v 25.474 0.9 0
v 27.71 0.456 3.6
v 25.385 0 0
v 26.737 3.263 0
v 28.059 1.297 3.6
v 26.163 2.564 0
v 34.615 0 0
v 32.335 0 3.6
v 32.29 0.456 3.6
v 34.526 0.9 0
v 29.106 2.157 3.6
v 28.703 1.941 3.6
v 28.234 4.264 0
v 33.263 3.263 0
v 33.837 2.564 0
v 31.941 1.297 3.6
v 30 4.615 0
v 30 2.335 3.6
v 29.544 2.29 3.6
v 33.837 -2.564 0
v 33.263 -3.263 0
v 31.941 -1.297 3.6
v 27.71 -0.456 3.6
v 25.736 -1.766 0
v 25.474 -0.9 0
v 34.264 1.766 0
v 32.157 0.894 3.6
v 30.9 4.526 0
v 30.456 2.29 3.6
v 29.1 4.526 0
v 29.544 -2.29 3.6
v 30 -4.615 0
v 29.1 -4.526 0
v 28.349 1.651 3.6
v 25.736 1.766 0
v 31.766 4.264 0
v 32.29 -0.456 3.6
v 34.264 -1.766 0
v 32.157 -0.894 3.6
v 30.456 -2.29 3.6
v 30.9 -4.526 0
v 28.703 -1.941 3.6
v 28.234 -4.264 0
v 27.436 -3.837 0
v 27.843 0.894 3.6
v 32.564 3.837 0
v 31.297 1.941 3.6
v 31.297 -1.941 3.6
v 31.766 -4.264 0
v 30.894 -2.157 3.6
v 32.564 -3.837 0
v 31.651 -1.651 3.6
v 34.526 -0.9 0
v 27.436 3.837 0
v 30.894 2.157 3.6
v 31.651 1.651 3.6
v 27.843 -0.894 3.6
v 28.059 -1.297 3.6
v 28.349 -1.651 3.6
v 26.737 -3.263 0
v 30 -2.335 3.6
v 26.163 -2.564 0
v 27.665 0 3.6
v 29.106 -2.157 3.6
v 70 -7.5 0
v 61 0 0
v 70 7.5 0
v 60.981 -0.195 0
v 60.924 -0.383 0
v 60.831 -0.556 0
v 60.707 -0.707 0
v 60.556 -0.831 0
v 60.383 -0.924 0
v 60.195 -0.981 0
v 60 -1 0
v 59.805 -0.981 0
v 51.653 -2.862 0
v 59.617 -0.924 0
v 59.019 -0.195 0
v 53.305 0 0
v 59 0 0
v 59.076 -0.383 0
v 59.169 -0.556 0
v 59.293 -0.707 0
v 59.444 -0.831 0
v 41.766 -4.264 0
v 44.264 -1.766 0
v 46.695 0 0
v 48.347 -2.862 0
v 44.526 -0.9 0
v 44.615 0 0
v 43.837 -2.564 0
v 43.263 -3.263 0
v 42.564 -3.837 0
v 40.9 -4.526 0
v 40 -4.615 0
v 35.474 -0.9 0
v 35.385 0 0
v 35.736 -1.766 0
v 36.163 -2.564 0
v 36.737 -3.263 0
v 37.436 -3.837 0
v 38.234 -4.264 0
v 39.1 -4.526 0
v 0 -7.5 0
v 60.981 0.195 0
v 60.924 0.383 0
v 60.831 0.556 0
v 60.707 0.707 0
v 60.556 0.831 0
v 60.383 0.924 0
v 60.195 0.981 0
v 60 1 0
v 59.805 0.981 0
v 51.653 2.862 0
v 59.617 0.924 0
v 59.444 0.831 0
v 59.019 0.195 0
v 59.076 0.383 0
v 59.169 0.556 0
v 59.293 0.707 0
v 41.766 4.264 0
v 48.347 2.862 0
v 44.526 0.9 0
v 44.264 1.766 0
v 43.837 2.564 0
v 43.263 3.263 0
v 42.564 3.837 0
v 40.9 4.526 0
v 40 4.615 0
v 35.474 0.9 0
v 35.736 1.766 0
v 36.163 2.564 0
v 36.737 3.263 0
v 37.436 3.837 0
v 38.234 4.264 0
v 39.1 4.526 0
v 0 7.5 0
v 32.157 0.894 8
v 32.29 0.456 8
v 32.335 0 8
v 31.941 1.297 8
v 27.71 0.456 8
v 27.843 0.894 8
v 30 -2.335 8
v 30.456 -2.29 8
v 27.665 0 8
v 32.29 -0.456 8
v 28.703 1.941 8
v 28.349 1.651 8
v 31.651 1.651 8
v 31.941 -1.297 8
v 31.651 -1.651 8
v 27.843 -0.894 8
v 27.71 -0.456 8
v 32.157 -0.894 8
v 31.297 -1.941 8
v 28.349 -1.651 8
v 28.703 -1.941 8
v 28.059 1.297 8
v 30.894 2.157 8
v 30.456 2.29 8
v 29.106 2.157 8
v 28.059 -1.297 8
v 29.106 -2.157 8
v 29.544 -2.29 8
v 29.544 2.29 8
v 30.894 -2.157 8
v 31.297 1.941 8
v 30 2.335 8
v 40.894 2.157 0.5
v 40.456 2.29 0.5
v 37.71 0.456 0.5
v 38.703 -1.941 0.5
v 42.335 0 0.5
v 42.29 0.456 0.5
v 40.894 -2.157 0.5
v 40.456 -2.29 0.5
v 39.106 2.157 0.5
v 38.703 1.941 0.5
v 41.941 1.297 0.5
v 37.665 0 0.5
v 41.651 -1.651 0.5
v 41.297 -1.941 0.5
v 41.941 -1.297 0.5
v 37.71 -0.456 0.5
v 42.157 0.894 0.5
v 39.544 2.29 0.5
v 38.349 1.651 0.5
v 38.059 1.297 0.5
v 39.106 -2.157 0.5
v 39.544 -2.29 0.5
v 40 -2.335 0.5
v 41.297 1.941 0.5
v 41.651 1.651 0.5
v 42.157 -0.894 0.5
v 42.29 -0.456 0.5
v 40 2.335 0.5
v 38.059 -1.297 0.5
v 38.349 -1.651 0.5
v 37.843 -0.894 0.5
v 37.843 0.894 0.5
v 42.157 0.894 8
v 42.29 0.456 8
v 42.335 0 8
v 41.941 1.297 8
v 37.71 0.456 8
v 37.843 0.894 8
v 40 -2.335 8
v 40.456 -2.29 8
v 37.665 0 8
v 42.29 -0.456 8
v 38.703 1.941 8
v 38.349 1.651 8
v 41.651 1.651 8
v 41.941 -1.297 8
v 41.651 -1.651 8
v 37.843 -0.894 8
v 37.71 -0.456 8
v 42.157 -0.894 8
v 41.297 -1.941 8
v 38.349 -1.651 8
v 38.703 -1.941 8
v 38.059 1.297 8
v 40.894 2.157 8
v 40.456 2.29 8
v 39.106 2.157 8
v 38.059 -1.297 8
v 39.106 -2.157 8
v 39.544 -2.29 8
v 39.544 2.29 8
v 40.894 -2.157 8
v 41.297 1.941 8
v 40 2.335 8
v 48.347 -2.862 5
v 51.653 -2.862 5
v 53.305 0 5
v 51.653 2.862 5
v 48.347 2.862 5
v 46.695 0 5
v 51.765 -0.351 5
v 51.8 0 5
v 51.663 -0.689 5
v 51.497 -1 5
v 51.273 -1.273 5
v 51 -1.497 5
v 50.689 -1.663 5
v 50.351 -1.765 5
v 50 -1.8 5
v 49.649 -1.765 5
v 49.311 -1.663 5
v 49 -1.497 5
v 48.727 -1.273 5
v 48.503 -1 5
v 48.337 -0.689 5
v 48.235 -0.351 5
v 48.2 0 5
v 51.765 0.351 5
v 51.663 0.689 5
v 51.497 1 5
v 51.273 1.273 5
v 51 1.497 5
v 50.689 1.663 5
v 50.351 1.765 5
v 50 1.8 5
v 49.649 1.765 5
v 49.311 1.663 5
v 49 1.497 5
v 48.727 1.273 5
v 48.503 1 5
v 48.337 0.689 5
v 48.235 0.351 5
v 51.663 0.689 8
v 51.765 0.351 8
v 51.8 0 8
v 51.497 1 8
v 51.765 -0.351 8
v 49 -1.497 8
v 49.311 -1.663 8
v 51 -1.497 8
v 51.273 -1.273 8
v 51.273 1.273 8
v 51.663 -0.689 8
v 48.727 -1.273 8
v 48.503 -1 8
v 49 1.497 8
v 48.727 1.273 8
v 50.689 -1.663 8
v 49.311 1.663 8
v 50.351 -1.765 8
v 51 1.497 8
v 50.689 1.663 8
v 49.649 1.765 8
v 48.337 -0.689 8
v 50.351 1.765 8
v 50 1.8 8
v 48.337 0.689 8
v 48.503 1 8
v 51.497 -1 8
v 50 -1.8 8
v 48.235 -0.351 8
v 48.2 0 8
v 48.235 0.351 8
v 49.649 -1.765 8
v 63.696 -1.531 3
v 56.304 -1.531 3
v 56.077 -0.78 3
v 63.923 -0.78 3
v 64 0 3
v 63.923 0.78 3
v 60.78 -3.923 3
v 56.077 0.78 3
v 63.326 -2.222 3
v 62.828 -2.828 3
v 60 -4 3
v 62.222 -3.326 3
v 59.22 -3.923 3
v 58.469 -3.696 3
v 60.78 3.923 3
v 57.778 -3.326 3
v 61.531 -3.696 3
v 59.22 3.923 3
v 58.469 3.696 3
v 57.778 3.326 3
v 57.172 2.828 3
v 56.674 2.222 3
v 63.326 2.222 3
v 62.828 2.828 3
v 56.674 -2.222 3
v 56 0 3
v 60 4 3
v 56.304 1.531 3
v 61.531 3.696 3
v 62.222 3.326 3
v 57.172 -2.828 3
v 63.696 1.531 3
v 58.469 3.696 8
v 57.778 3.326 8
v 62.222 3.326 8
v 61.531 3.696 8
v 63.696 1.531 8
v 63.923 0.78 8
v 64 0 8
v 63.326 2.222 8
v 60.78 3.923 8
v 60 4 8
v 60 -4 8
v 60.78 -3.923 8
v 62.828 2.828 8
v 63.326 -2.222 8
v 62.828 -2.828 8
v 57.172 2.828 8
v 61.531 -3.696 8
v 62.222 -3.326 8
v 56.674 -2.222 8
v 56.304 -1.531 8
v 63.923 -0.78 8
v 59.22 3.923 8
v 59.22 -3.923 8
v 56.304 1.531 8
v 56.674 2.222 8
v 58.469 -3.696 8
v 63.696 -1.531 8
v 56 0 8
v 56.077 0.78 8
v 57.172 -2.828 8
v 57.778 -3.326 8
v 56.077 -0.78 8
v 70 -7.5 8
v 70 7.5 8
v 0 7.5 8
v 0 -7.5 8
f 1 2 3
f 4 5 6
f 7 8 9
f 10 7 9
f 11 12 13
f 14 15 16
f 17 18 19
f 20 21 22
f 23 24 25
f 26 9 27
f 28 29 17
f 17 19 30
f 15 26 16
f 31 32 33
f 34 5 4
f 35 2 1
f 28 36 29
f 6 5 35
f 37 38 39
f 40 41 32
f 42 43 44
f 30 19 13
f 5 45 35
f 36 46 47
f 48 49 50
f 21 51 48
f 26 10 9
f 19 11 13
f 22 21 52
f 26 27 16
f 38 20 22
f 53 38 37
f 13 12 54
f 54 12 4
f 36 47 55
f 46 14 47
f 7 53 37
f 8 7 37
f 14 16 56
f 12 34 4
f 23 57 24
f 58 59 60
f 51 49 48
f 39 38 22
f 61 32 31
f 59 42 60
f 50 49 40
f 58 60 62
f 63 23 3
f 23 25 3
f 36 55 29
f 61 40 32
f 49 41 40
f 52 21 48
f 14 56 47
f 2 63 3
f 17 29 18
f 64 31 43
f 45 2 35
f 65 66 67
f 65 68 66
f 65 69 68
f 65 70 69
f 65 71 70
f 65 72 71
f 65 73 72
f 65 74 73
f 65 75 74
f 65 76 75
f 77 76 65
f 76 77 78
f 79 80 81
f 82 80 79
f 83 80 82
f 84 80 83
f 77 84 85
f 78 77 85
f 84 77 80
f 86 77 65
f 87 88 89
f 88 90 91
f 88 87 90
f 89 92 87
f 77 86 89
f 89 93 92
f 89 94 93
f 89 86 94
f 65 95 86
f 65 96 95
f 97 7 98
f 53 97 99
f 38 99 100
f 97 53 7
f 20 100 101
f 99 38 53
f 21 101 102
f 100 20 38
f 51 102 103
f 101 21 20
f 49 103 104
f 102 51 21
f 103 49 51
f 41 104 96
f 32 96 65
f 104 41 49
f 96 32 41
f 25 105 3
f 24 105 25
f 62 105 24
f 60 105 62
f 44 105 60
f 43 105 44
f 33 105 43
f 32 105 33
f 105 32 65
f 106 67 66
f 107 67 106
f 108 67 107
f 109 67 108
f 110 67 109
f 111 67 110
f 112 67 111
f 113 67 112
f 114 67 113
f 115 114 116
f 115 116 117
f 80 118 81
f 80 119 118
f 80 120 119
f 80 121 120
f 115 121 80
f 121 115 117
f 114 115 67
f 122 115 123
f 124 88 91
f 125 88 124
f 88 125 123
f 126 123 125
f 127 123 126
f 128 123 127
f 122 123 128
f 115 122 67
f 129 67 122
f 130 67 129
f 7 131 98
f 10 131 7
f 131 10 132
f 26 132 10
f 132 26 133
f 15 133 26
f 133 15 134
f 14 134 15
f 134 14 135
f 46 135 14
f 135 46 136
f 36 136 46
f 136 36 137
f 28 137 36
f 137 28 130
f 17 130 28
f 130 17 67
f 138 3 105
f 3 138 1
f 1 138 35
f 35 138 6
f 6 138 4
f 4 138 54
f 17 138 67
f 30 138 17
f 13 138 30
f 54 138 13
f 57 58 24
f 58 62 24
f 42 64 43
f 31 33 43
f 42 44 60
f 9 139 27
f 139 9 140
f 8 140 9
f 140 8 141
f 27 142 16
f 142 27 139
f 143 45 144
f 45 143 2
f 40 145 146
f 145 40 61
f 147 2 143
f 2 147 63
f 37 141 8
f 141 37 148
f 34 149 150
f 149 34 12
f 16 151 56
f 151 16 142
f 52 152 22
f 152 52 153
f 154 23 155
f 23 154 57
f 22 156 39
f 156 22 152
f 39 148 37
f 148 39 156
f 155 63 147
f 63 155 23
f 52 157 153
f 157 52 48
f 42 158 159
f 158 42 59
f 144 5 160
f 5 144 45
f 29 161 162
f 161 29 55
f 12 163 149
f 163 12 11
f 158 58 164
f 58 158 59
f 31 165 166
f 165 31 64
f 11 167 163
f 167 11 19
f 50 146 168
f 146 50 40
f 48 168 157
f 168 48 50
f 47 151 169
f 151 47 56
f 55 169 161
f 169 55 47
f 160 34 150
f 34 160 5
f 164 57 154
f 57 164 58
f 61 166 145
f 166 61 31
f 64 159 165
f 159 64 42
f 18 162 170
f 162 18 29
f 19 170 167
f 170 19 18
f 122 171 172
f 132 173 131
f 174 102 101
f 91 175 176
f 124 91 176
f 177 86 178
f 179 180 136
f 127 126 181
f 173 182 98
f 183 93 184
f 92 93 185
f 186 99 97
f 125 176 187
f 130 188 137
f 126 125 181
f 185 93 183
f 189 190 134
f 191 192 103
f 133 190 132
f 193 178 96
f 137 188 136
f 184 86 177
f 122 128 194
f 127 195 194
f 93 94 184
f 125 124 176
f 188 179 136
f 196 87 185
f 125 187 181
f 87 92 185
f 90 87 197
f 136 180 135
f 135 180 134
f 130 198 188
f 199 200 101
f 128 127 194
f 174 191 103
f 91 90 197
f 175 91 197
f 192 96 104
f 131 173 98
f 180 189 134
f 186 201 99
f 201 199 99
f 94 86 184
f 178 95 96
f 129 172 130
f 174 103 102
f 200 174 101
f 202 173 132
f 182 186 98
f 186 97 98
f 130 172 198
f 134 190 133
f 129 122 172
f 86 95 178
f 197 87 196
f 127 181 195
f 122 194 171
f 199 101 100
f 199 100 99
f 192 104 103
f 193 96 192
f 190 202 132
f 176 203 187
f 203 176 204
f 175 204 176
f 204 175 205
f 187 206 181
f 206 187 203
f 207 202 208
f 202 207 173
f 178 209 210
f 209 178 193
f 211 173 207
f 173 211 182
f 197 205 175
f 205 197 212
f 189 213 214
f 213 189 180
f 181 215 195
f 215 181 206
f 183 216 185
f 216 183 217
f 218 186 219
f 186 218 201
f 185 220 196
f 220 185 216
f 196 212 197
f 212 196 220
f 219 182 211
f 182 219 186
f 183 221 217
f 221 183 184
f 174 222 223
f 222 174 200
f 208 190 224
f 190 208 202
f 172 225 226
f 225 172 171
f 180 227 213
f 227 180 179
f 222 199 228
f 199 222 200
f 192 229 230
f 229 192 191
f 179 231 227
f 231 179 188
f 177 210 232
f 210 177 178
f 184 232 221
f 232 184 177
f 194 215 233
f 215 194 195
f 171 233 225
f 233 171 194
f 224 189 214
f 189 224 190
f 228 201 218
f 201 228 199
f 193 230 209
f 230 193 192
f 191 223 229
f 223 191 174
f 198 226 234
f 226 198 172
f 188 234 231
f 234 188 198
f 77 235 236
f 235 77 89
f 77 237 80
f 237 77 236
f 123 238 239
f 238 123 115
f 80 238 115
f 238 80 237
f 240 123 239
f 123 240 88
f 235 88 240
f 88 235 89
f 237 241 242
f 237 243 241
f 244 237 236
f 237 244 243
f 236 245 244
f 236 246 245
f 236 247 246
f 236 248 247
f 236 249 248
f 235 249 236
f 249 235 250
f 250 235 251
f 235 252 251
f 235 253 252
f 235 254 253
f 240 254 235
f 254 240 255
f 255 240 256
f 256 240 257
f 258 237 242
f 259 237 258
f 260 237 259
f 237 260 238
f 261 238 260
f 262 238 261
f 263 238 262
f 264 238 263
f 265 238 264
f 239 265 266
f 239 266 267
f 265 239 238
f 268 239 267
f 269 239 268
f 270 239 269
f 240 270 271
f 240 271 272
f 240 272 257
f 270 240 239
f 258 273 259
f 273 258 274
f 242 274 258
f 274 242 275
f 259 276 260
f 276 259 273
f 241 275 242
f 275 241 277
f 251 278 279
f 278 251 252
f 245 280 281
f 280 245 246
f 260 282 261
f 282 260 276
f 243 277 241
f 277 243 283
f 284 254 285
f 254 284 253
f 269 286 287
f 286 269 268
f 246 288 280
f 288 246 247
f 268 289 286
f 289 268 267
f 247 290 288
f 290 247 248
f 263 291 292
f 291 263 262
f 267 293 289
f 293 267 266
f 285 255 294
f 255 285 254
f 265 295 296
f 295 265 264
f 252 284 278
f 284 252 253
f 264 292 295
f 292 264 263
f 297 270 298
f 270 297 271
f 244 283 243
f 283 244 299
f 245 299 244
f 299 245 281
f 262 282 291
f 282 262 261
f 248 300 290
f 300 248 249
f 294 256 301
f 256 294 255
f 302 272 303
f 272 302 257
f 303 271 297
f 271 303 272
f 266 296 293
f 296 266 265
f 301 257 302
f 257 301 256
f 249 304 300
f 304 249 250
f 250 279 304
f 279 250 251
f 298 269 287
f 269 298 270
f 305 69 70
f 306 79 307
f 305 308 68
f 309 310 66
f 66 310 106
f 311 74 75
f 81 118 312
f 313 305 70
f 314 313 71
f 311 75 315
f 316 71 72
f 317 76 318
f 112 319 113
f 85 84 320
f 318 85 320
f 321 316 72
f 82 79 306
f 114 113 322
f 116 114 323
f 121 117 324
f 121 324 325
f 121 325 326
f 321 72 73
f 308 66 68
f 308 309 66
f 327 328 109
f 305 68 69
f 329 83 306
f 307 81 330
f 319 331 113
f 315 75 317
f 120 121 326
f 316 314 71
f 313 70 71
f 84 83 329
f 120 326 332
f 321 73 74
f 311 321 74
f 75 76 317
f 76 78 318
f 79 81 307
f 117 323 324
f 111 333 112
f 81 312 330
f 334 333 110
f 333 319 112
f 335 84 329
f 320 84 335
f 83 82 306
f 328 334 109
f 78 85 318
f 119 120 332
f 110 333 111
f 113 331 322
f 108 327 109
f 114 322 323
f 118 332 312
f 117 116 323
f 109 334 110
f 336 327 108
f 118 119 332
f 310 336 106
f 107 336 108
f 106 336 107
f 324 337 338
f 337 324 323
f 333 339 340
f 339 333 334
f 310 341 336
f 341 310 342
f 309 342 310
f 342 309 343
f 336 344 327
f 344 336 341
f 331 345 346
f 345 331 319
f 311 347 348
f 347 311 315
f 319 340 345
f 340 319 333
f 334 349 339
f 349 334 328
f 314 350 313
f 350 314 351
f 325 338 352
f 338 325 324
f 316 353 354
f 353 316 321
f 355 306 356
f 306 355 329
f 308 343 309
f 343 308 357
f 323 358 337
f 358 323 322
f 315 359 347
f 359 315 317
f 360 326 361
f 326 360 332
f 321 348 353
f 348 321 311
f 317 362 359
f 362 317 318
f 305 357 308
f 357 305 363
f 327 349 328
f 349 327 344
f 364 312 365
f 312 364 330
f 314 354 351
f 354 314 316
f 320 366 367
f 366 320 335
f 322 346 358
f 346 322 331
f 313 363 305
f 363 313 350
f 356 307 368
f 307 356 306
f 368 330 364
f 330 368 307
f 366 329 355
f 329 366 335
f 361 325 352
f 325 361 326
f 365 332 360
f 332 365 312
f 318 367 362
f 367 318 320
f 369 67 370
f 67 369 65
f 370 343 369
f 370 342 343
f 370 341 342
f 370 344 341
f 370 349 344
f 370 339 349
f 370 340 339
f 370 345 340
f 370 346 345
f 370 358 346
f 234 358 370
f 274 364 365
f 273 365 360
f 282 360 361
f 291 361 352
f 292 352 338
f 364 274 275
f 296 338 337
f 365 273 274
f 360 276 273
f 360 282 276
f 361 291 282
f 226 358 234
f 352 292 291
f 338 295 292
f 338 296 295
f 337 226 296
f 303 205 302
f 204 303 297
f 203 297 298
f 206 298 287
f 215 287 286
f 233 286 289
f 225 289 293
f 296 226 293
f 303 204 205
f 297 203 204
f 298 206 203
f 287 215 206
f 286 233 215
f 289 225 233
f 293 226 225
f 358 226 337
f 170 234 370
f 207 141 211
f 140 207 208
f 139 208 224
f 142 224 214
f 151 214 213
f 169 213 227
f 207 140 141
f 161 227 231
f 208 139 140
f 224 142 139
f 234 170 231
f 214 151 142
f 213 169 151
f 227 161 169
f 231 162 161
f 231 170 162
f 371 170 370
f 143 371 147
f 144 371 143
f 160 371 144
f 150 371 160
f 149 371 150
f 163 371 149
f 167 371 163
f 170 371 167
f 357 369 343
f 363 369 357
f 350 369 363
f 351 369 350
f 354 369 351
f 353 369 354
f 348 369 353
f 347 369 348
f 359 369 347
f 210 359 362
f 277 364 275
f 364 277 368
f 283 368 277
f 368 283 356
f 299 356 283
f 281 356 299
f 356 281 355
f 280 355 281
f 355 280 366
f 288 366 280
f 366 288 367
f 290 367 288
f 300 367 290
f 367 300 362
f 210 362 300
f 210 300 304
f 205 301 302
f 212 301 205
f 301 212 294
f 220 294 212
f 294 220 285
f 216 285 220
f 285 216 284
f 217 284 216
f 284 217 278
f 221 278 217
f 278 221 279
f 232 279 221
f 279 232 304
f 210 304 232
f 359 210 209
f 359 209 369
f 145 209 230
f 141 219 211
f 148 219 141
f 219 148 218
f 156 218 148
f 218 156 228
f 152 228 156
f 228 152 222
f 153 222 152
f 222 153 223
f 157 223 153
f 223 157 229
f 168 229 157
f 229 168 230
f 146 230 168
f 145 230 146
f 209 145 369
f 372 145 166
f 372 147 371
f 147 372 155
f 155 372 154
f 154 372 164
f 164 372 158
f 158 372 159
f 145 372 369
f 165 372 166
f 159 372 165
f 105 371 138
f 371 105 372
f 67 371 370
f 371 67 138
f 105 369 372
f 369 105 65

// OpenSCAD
// file: ScrewLibrary.scad
// Screw hole library

// Declare the supported screws here

// To add new screws, define the 5 values below, and add
// code to the IsScrewSupported() and ScrewHeadHeight() function
    
// spec is based on "traditional" wood screws
US5FlatStr = "US#5 Flat";
US5FlatHeadHeight = 2.8;    // caliper
US5FlatHeadDiameter = 6.35; // head bore 1/4
US5FlatHeadStraight = false;
US5FlatHeadHex = false;
US5FlatDiameter = 3.18;    // major diameter 1/8
US5FlatClearance = 0.5;

/* ad hoc measured by caliper
US5FlatHeadHeight = 2.8;
US5FlatHeadDiameter = 5.8;
US5FlatDiameter = 3.2;
US5FlatClearance = 0.5;
*/

US6FlatStr = "US#6 Flat";
US6FlatHeadHeight = 2.8; // A caliper
US6FlatHeadDiameter = 8.0; // head bore 9/32
US6FlatHeadStraight = false;
US6FlatHeadHex = false;
US6FlatDiameter = 3.51;     // major dia. 0.138"
US6FlatClearance = 0.5;

US8FlatStr = "US#8 Flat"; 
US8FlatHeadHeight = 3.6;
US8FlatHeadDiameter = 8.73; // head bore 11/32
US8FlatHeadStraight = false;
US8FlatHeadHex = false;
US8FlatDiameter = 4.17;     // major dia. 0.164"
US8FlatClearance = 0.5;

US8RoundStr = "US#8 Round"; 
US8RoundHeadHeight = 0.5; // keep a slight recess marking 
US8RoundHeadDiameter = 8.73; // head bore 11/32
US8RoundHeadStraight = false;
US8RoundHeadHex = false;
US8RoundDiameter = 4.17;     // major dia. 0.164"
US8RoundClearance = 0.5;

M3NutStr = "M3 Nut"; 
M3NutHeadHeight = 5; // double the m3 spec for more room 
M3NutHeadDiameter = 6.01; 
M3NutHeadStraight = true;
M3NutHeadHex = true;
M3NutDiameter = 3;   
M3NutClearance = 0.6;

PencilMarkerStr = "Pencil Marker";
PencilMarkerHeadHeight = 3;
PencilMarkerHeadDiameter = 2;
PencilMarkerHeadStraight = false;
PencilMarkerHeadHex = false;
PencilMarkerDiameter = 8;
PencilMarkerClearance = 0;

CustomScrewStr = "custom";

// Utilities
module CreateScrewHole(height=15,diameter=3.3) {
    // height is the hypothetical screw height. It
    // can be anything as long as it penetrates the
    // object we are modelling. So 15mm is plenty
    $fn=32;
    translate([0, 0, height / 2])
        cylinder(height, diameter / 2, diameter / 2, center = true);
}

module CreateScrewHead(headsize = 5.9, bodysize = 3.3, height = 2.8,is_hex = false) {
    $fn=is_hex? 6 : 32;
    translate([0, 0, height / 2])
        cylinder(height, headsize / 2, bodysize / 2, center = true);
}

module CreateHeadHole(headsize = 5.9, head_hole_length = 0, is_hex = false) {
    $fn=is_hex? 6 :32;
    r = headsize / 2;
    translate([0, 0, - head_hole_length / 2])
        cylinder(head_hole_length, r, r, true);
}

module CreateScrewRAW(
    head_diameter = 0,
    head_hole_length = 0,
    head_height = 0,
    head_straight = 0,
    head_hex = false,
    body_diameter = 0,
    body_length = 0)
{
    // the parameters should be already adjusted by clearance    
    union(){        
        CreateHeadHole(head_diameter, head_hole_length, head_hex);
  
        if (head_straight)
        {
            // no slope from head to screw hole
            CreateScrewHead(head_diameter, 
                head_diameter, head_height, head_hex);
        }
        else
        {
            // slope from head to screw hole
            CreateScrewHead(head_diameter, 
                body_diameter, head_height, head_hex);
        }
        
        translate([0,0,head_height])
        CreateScrewHole(body_length, body_diameter);
    }
}        

// Public interface
function IsScrewSupported(style) =
    style == US5FlatStr ||
    style == US6FlatStr ||
    style == US8FlatStr ||
    style == US8RoundStr ||
    style == M3NutStr ||
    style == PencilMarkerStr ||
    style == CustomScrewStr;
    
function ScrewHeadHeight(style) =
    style == US5FlatStr ? US5FlatHeadHeight :
      style == US6FlatStr ? US6FlatHeadHeight :
      style == US8FlatStr ? US8FlatHeadHeight : 
      style == US8RoundStr ? US8RoundHeadHeight :
      style == M3NutStr ? M3NutHeadHeight :
      style == PencilMarkerStr ? PencilMarkerHeadHeight : 0;

// Create screw using customized parameter specified by caller
module CreateCustomScrew(
    head_diameter = 0,
    head_hole_length = 0,
    head_height = 0,
    head_straight = true,
    head_hex = false,
    body_diameter = 0,
    body_length = 0,
    screw_clearance = 0)
{
    CreateScrewRAW(
        head_diameter + screw_clearance,
        head_hole_length,
        head_height,
        head_straight,
        head_hex,
        body_diameter + screw_clearance,
        body_length);
}

// Create screw using built-in parameter
module CreateScrew(
    style="",
    head_hole_length=0,
    body_length=15,
    // Below are required for custom screws only
    head_diameter=0,
    head_height=0,
    head_straight=true,
    head_hex = false,
    body_diameter=0,
    screw_clearance=0)
{        
    assert(IsScrewSupported(style));
    
    if (style==US5FlatStr) {
        CreateCustomScrew(
            US5FlatHeadDiameter,
            head_hole_length,
            US5FlatHeadHeight,
            US5FlatHeadStraight,
            US5FlatHeadHex,
            US5FlatDiameter,
            body_length,
            US5FlatClearance
        );
    }
    else if (style==US6FlatStr) {
        CreateCustomScrew(
            US6FlatHeadDiameter,
            head_hole_length,
            US6FlatHeadHeight,
            US6FlatHeadStraight,
            US6FlatHeadHex,
            US6FlatDiameter,
            body_length,
            US6FlatClearance
        );
    } else if (style == US8FlatStr) {
        CreateCustomScrew(
            US8FlatHeadDiameter,
            head_hole_length,
            US8FlatHeadHeight,
            US8FlatHeadStraight,
            US8FlatHeadHex,
            US8FlatDiameter,
            body_length,
            US8FlatClearance
        );
    } else if (style == US8RoundStr) {
        CreateCustomScrew(
            US8RoundHeadDiameter,
            head_hole_length,
            US8RoundHeadHeight,
            US8RoundHeadStraight,
            US8RoundHeadHex,
            US8RoundDiameter,
            body_length,
            US8RoundClearance
        );
    } else if (style == M3NutStr) {
        CreateCustomScrew(
            M3NutHeadDiameter,
            head_hole_length,
            M3NutHeadHeight,
            M3NutHeadStraight,
            M3NutHeadHex,
            M3NutDiameter,
            body_length,
            M3NutClearance
        );
    } else if (style == PencilMarkerStr) {
        CreateCustomScrew(
            PencilMarkerHeadDiameter,
            head_hole_length,
            PencilMarkerHeadHeight,
            PencilMarkerHeadStraight,
            PencilMarkerHeadHex,
            PencilMarkerDiameter,
            body_length,
            PencilMarkerClearance
        );
    } else if (style == CustomScrewStr) {
        CreateCustomScrew(
            head_diameter,
            head_hole_length,
            head_height,
            head_straight,
            head_hex,
            body_diameter,
            body_length,
            screw_clearance);
    }
    else assert(false);
} // end CreateScrew    



         
       
// main file
include <ScrewLibrary.scad>

$fn=32;

h1=0;
h2=15;

//testing block
block_length=70;

difference()
{
translate([block_length/2,0,4]) cube([block_length,15,8],center=true);
/*
translate([10,0,0])
CreateScrew(US5FlatStr, h1, h2);

translate([20,0,0])
CreateScrew(US6FlatStr, h1, h2);
*/
translate([30,0,0])
CreateScrew(US8FlatStr, h1, h2);

translate([40,0,0])
CreateScrew(US8RoundStr, h1, h2);
    
translate([50,0,0])
CreateScrew(M3NutStr, h1, h2);
    
translate([60,0,0])
CreateScrew(PencilMarkerStr, h1, h2);
}

/*

difference() {
    color("red")
cylinder(10,r=5,$fn=32);
cylinder(10,r=5,$fn=6);}
*/
